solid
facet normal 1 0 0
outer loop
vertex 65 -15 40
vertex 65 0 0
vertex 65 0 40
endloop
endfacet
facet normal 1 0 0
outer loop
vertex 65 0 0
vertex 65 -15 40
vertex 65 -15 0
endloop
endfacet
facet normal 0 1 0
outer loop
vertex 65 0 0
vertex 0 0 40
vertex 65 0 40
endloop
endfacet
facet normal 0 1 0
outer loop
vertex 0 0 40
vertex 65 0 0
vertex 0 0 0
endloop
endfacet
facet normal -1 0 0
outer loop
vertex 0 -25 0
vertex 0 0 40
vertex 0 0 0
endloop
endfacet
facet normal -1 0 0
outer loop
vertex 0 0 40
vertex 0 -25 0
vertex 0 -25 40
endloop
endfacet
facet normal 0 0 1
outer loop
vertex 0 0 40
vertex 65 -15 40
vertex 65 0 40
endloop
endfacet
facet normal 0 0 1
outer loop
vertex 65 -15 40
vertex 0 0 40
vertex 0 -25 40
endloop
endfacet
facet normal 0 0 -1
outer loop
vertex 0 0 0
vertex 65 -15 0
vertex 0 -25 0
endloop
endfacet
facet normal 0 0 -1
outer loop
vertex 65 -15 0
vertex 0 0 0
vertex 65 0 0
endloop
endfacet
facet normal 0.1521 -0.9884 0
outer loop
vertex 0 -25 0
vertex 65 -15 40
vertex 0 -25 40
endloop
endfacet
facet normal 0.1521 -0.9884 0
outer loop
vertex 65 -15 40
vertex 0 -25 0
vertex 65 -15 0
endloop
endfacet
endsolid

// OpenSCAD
module wedge (h1 = 25, h2 = 15, l=65, w=40)
{
    alpha = atan ((h1 - h2) / l);
    difference () {
        cube ([l, w, h1]);
        translate ([0, 0, h1])
            rotate ([0, alpha, 0])
                translate ([-l, -w, 0])
                    cube ([3*l, 3*w, h1]);
    }
}

rotate ([90, 0, 0])
    wedge ();
